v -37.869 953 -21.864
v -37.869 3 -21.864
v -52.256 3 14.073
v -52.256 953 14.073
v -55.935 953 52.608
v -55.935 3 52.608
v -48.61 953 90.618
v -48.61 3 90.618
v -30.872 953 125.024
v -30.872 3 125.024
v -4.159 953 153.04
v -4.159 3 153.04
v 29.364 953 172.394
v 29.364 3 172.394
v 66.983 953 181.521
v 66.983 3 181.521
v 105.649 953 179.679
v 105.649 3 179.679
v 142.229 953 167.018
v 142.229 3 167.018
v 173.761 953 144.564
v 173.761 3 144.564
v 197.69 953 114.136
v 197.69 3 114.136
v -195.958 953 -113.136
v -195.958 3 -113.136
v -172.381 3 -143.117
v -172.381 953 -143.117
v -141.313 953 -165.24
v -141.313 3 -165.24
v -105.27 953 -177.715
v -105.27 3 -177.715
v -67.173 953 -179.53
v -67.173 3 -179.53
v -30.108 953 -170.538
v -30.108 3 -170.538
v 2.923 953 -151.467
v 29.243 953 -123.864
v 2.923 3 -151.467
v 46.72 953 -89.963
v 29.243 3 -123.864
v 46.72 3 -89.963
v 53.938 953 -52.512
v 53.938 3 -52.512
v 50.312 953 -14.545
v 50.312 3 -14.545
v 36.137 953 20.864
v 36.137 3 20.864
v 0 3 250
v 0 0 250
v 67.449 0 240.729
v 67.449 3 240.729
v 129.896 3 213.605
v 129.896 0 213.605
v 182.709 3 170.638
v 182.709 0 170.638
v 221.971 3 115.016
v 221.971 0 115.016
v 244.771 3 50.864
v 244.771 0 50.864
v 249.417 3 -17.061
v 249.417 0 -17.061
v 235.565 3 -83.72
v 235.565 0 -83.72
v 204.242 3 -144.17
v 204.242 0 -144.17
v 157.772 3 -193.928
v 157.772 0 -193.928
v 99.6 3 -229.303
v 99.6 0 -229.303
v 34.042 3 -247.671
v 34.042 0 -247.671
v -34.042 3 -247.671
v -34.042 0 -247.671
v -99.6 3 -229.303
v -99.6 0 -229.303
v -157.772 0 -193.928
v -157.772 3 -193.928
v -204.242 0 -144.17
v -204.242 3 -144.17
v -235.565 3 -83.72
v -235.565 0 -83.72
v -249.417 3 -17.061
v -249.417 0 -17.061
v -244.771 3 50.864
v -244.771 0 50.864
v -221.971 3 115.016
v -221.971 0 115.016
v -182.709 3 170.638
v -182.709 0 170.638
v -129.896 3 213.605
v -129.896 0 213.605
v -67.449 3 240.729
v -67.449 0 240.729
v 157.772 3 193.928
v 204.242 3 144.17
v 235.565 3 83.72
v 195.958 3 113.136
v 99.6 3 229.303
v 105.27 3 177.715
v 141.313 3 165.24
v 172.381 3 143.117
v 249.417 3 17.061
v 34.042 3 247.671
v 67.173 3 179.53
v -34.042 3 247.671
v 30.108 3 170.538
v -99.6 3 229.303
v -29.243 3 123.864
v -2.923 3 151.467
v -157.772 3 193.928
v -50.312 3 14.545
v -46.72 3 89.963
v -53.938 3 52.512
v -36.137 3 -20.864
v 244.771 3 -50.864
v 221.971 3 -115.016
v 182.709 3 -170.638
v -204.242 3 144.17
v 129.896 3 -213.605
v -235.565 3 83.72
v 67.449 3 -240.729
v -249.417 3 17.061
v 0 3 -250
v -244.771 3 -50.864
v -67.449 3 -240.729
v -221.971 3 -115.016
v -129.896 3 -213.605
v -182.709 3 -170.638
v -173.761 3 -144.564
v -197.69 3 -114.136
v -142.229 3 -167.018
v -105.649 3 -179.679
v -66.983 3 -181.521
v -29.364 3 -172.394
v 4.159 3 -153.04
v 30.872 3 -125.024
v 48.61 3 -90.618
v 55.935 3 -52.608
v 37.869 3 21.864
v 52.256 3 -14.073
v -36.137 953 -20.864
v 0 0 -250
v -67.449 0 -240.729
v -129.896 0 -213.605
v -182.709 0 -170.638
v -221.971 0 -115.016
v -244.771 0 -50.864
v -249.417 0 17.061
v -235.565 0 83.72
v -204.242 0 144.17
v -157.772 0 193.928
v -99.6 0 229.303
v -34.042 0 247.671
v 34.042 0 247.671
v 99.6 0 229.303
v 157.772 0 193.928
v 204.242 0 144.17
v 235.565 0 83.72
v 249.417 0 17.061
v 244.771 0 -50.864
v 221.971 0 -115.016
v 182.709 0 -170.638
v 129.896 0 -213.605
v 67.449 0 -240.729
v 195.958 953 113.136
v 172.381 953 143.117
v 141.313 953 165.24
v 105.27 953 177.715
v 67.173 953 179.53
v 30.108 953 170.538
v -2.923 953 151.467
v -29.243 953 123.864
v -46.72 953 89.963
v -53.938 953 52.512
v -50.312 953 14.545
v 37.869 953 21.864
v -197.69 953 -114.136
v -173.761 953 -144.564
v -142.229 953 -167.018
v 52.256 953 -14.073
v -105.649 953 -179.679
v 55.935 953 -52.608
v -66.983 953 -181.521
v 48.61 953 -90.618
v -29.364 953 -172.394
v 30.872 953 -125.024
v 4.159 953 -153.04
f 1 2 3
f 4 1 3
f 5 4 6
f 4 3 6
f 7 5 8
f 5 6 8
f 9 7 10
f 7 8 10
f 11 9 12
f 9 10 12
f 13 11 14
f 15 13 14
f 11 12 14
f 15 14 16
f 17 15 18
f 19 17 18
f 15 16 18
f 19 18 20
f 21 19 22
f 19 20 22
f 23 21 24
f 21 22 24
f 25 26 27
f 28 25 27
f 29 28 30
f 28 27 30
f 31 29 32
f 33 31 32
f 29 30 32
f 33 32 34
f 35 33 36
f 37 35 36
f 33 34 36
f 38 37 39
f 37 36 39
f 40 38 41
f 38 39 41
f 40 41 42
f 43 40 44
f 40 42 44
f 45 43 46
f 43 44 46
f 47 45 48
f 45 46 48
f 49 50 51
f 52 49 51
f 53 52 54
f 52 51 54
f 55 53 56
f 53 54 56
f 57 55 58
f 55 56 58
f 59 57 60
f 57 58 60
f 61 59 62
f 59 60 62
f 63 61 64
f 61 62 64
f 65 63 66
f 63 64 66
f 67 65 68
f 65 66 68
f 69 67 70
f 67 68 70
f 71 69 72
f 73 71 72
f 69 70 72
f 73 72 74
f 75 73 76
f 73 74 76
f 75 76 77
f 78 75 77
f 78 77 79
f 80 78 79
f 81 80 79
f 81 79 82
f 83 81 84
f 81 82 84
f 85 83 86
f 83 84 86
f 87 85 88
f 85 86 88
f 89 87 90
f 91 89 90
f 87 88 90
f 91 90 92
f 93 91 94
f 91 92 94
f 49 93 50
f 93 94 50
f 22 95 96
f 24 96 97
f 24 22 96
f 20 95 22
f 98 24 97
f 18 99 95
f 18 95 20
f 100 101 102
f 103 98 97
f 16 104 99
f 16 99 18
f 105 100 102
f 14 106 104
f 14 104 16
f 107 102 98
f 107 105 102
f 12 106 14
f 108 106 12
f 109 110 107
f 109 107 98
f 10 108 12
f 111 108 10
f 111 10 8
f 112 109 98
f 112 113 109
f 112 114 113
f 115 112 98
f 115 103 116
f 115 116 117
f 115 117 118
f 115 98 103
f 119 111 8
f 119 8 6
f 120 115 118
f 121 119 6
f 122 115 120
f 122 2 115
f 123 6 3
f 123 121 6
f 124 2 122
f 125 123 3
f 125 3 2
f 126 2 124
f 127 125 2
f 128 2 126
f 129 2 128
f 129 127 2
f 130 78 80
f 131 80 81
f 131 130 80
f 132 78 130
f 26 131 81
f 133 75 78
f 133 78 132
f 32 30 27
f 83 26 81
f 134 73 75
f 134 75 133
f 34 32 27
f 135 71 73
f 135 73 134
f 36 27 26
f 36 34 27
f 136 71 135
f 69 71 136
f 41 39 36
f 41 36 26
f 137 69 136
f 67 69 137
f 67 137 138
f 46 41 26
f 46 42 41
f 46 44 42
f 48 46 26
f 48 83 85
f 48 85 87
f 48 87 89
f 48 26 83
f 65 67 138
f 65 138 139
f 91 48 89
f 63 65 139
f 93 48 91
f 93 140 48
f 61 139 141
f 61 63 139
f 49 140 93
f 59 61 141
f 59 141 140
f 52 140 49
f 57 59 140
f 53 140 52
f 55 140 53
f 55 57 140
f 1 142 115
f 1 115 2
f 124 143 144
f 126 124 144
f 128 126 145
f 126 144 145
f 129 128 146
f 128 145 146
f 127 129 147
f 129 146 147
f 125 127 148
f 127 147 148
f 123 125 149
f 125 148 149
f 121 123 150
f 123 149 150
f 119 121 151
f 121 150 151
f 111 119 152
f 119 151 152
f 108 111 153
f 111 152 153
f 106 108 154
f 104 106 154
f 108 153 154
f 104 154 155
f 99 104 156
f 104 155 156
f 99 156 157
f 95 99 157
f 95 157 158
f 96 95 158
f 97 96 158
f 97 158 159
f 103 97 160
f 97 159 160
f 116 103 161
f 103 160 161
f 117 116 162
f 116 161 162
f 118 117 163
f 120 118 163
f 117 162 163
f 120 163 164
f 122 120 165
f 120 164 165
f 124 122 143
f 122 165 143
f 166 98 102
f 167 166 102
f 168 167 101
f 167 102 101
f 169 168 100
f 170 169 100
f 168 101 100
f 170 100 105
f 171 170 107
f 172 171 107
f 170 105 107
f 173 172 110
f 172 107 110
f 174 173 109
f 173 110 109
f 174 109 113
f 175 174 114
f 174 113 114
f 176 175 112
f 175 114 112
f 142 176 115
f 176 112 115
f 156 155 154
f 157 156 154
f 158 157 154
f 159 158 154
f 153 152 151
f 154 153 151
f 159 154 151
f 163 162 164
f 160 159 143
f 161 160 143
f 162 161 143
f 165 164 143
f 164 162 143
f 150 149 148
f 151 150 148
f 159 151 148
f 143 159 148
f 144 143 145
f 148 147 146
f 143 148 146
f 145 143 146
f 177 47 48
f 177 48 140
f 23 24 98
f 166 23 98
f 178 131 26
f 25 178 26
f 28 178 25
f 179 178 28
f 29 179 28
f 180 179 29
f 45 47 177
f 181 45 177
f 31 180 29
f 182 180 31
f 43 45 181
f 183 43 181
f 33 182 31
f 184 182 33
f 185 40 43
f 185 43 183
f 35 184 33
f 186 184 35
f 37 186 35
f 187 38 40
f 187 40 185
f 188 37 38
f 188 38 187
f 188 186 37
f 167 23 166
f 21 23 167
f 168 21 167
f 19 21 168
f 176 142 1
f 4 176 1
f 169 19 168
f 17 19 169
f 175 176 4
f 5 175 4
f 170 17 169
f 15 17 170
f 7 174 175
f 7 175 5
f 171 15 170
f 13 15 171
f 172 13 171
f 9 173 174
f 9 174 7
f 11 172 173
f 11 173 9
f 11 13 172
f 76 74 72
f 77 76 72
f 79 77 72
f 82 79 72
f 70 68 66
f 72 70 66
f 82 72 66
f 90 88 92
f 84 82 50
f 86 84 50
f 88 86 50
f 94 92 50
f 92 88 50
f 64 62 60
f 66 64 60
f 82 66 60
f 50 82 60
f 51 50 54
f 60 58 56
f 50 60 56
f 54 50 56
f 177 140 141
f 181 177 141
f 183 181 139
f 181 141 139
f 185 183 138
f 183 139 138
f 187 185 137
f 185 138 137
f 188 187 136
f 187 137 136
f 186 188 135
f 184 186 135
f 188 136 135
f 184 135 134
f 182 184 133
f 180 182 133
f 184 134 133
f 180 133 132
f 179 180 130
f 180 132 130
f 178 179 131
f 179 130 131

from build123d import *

# Parameters (mm, degrees)
CROQUIS1_R              = 250
SALIENTE_EXTRUIR1_DEPTH = 3
SALIENTE_EXTRUIR2_DEPTH = 950
MATRIZC1_COUNT          = 2


with BuildPart() as part:
    # Croquis1 → Saliente-Extruir1 (new body)
    with BuildSketch(Plane(origin=(0, 0, 0), x_dir=(1, 0, 0), z_dir=(0, 1, 0))):
        with Locations(Location((0, 0, 0), (0, 0, 270))):
            Circle(CROQUIS1_R)
    extrude(amount=SALIENTE_EXTRUIR1_DEPTH)

    # Croquis2 → Saliente-Extruir2 (add)
    with BuildSketch(Plane(origin=(0, 3, 0), x_dir=(1, 0, 0), z_dir=(0, 1, 0))):
        with BuildLine():
            Line((-197.689980809, 114.136363636), (-195.957930002, 113.136363636))
            ThreePointArc((-195.957930002, 113.136363636), (-12.910525895, 162.183767743), (36.136878212, -20.863636364))
            Line((36.136878212, -20.863636364), (37.86892902, -21.863636364))
            ThreePointArc((37.86892902, -21.863636364), (-11.910525895, 163.915818551), (-197.689980809, 114.136363636))
        make_face()
    extrude(amount=SALIENTE_EXTRUIR2_DEPTH)


with BuildPart() as matrizc1_1:
    # MatrizC1: pattern copy
    add(part.part.rotate(Axis((0, 0, 0), (0, 1, 0)), 1 * 360 / MATRIZC1_COUNT))


solid = Compound([part.part, matrizc1_1.part])
